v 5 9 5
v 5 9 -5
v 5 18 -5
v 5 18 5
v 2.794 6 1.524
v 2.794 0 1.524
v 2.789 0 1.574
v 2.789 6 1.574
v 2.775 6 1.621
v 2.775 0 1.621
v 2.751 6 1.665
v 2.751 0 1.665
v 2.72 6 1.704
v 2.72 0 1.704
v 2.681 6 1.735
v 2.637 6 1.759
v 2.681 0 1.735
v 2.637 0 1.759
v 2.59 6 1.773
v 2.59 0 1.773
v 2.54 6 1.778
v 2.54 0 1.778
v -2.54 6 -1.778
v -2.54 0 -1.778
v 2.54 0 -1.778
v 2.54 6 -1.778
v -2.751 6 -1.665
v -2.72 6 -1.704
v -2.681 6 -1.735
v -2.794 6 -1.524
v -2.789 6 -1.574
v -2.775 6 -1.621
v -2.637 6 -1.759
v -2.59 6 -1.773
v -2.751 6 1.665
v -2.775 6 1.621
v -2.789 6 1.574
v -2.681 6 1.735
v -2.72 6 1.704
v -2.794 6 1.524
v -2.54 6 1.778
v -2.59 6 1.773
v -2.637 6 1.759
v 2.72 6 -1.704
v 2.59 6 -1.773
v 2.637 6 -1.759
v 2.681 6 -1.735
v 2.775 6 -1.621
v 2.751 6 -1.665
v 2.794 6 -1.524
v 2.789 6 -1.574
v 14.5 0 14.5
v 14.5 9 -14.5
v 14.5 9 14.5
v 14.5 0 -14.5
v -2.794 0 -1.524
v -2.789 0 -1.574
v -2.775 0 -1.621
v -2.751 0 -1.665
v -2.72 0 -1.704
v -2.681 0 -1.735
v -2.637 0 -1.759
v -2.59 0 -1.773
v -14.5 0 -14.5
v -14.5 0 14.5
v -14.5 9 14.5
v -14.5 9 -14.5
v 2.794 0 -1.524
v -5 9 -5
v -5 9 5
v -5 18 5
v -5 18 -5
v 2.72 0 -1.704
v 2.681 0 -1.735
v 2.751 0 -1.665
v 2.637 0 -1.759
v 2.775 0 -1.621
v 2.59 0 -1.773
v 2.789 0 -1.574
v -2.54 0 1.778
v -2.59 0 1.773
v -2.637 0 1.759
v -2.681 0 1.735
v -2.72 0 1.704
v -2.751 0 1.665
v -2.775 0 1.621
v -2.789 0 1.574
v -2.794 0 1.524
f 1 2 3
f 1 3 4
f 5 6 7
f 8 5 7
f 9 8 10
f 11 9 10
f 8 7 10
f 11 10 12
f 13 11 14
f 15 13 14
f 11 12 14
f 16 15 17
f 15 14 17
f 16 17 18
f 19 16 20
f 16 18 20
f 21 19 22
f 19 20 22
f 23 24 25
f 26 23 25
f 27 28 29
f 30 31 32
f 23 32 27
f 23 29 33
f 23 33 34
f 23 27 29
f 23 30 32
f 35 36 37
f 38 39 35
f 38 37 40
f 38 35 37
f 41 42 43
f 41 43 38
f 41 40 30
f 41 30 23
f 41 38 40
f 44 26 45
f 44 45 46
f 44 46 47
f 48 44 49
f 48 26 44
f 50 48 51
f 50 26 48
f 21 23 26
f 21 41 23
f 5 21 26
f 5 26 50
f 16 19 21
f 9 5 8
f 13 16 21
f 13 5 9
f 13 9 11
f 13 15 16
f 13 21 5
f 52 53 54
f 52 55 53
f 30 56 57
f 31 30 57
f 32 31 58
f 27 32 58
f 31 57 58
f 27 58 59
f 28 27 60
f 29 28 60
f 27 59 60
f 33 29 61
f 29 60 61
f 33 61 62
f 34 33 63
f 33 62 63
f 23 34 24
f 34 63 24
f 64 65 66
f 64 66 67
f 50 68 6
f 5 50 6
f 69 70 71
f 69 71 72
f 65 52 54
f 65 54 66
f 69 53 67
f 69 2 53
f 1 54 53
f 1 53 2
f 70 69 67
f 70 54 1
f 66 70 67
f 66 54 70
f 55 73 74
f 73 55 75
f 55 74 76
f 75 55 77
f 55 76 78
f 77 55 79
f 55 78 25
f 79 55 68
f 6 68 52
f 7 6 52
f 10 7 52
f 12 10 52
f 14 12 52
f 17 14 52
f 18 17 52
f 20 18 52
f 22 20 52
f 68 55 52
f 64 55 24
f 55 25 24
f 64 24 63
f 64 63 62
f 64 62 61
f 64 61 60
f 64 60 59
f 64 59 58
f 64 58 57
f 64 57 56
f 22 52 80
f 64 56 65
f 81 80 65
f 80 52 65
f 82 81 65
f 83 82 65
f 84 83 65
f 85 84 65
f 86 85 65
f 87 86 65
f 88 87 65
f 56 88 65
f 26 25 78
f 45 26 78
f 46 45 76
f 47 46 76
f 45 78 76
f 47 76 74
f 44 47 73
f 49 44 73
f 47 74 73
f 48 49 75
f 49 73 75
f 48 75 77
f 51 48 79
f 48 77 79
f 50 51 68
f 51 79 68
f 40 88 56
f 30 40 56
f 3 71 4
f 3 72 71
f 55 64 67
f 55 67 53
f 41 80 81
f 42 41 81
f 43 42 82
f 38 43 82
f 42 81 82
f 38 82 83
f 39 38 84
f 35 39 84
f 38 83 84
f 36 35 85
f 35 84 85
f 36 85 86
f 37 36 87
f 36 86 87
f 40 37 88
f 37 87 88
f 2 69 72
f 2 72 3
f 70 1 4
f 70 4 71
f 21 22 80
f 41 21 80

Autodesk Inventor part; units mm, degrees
ref_plane "YZ Plane" through (0, 0, 0) normal (1, 0, 0) x (0, 1, 0)
ref_plane "XZ Plane" through (0, 0, 0) normal (0, 1, 0) x (-1, 0, 0)
ref_plane "XY Plane" through (0, 0, 0) normal (0, 0, 1) x (1, 0, 0)
sketch "Sketch1" plane through (0, 0, 0) normal (0, 1, 0) x (-1, 0, 0)
  line L0 (14.5, -14.5) -> (-14.5, -14.5)
  line L1 (-14.5, -14.5) -> (-14.5, 14.5)
  line L2 (-14.5, 14.5) -> (14.5, 14.5)
  line L3 (14.5, 14.5) -> (14.5, -14.5)
  dimension "d11" = 29
  dimension "d14" = 29
extrude "Extrusion1" add sketch "Sketch1" along normal blind 9
sketch "Sketch2" plane through (0, 9, 0) normal (0, 1, 0) x (1, 0, 0)
  line L0 (-5, 5) -> (5, 5)
  line L1 (5, 5) -> (5, -5)
  line L2 (5, -5) -> (-5, -5)
  line L3 (-5, -5) -> (-5, 5)
  line L4 (14.5, 14.5) -> (-14.5, 14.5) projected
  line L5 (14.5, -14.5) -> (14.5, 14.5) projected
  line L6 (-14.5, -14.5) -> (14.5, -14.5) projected
  line L7 (-14.5, 14.5) -> (-14.5, -14.5) projected
  point P0 (0, 0)
  dimension "d15" = 9.5
  dimension "d16" = 9.5
  dimension "d17" = 9.5
  dimension "d18" = 9.5
extrude "Extrusion2" add sketch "Sketch2" along normal blind 9 contours L0 L1 L2 L3
sketch "Sketch3" plane through (0, 0, 0) normal (0, -1, 0) x (1, 0, 0)
  line L0 (2.54, 1.778) -> (-2.54, 1.778)
  line L1 (-2.794, 1.524) -> (-2.794, -1.524)
  line L2 (-2.54, -1.778) -> (2.54, -1.778)
  line L3 (2.794, -1.524) -> (2.794, 1.524)
  arc A0 (2.794, 1.7526) -> (2.7686, 1.778) centre (2.7686, 1.7526) ccw
  arc A1 (2.794, 1.524) -> (2.54, 1.778) centre (2.54, 1.524) ccw
  arc A2 (2.54, -1.778) -> (2.794, -1.524) centre (2.54, -1.524) ccw
  arc A3 (-2.794, -1.524) -> (-2.54, -1.778) centre (-2.54, -1.524) ccw
  arc A4 (-2.54, 1.778) -> (-2.794, 1.524) centre (-2.54, 1.524) ccw
  point P0 (0, 0)
  point P1 (-0.254, 0)
  point P2 (-0.254, 0)
  dimension "d21" = 1.778
  dimension "d22" = 3.556
  dimension "d23" = 5.588
  dimension "d24" = 2.54
  dimension "d25" = 0.0254
  dimension "d26" = 0.254
  dimension "d27" = 2.794
  dimension "d28" = 1.778
extrude "Extrusion3" cut sketch "Sketch3" against normal blind 6
sketch "Sketch4" plane through (0, 0, 0) normal (0, -1, 0) x (1, 0, 0)
  point P0 (0, 0)
equation "\"d14\" = d11"
equation "\"d16\" = d15"
equation "\"d17\" = d15"
equation "\"d18\" = d15"
equation "\"d21\" = 0.5 * d22"
properties part number "Motor_fit_check"
